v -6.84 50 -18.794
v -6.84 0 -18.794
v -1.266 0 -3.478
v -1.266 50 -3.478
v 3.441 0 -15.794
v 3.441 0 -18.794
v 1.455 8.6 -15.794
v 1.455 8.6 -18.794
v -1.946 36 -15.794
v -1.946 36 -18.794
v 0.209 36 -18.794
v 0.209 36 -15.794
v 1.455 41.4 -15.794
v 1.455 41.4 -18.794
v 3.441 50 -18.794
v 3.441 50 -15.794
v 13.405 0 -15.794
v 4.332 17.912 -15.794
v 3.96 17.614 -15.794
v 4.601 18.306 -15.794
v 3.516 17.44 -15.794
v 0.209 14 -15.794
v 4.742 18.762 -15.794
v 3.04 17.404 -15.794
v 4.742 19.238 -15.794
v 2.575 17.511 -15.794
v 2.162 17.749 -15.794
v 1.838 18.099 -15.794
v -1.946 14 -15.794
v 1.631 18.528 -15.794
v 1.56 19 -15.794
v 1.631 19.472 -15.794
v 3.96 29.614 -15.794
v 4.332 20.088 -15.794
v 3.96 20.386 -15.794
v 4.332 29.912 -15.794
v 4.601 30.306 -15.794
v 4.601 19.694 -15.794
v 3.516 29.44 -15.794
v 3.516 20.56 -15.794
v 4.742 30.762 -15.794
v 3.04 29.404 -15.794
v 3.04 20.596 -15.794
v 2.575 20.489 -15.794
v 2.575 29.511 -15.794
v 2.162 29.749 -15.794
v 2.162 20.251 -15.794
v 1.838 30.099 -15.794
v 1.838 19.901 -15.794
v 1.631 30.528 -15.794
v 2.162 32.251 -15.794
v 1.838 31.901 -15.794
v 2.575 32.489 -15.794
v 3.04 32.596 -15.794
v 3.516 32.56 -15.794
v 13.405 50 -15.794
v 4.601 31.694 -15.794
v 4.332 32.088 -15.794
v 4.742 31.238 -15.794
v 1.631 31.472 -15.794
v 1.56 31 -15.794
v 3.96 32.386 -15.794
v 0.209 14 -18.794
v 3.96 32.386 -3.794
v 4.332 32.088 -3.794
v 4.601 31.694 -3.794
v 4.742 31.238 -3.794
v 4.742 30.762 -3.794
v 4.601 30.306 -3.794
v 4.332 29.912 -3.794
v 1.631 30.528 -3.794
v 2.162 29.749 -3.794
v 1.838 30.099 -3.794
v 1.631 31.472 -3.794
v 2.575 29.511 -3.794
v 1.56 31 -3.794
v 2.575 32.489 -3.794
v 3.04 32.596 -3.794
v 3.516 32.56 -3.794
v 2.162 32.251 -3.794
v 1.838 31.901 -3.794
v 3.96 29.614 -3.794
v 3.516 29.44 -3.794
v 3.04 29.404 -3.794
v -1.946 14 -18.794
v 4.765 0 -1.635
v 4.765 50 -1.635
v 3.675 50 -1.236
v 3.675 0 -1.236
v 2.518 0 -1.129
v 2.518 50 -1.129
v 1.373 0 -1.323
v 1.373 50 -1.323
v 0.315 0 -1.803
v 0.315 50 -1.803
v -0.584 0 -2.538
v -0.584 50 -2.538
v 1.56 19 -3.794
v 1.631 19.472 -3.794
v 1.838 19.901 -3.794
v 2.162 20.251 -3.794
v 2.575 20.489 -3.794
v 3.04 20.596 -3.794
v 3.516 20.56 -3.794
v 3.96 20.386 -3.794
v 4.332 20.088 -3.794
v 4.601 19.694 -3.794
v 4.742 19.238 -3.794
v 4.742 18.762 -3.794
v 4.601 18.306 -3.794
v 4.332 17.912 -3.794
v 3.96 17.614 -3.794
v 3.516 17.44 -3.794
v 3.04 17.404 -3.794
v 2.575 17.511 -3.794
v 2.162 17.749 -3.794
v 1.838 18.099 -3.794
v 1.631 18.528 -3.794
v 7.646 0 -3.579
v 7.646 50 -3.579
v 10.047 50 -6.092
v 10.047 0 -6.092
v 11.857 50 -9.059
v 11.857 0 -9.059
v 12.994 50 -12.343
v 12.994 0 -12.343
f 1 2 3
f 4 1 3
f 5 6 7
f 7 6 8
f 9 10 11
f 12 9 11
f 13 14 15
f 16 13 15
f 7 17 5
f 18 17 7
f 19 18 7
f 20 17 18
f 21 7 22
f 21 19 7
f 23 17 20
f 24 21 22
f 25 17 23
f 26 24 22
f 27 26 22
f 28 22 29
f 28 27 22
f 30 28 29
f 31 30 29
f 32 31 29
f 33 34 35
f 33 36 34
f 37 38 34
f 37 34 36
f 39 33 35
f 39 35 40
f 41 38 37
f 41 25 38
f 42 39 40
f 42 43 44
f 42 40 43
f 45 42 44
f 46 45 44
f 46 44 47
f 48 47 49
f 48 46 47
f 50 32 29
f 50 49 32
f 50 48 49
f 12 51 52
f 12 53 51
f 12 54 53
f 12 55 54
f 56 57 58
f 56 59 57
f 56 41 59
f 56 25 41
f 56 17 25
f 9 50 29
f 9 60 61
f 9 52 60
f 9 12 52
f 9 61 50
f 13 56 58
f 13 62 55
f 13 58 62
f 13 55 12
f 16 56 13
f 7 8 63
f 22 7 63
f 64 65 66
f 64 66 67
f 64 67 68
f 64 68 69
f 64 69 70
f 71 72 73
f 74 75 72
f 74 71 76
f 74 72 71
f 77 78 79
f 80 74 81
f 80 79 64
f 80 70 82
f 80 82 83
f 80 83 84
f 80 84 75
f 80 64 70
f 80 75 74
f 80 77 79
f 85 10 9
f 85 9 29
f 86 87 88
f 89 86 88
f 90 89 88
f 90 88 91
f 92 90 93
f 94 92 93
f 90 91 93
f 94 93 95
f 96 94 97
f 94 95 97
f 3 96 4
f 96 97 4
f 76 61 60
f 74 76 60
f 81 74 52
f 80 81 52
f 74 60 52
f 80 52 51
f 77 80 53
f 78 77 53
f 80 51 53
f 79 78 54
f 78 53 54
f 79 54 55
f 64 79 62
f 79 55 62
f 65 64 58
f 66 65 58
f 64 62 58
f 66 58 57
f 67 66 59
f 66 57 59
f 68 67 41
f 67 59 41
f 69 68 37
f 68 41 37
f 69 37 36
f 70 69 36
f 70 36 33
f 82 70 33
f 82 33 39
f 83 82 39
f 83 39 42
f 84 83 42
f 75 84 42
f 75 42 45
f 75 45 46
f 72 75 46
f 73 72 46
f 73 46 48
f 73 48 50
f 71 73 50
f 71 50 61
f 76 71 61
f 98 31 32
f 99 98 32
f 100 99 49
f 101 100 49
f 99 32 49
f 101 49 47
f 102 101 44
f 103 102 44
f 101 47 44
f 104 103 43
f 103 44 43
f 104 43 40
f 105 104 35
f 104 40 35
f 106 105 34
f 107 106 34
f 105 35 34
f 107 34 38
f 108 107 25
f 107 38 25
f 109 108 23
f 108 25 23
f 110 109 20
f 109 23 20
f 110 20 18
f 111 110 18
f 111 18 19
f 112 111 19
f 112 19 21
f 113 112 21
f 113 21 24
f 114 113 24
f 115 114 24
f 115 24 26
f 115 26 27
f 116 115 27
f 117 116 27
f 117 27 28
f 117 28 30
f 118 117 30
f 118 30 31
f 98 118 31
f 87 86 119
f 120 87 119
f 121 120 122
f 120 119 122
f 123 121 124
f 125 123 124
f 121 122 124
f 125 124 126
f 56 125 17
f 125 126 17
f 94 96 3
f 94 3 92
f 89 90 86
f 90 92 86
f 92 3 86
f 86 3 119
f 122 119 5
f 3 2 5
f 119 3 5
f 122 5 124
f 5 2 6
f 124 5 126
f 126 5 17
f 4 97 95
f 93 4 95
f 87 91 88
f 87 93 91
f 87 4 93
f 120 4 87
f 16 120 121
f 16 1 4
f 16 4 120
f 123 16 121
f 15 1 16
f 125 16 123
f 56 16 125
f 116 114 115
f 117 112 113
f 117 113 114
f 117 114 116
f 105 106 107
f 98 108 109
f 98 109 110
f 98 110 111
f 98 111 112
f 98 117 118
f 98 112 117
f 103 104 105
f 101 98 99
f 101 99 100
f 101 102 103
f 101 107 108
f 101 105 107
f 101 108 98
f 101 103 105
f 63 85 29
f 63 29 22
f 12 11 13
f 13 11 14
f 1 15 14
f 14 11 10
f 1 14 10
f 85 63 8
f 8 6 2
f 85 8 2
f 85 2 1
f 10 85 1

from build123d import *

# Parameters (mm, degrees)
BOSS_EXTRUDE1_DEPTH = 50
CUT_EXTRUDE1_START  = -50
CUT_EXTRUDE1_DEPTH  = 50
SKETCH3_R           = 1.6
CUT_EXTRUDE2_DEPTH  = 15
SKETCH6_R           = 1.6
CUT_EXTRUDE4_DEPTH  = 3
SKETCH7_W           = 1.666520658
SKETCH7_H           = 50
CUT_EXTRUDE5_DEPTH  = 3
CUT_EXTRUDE6_DEPTH  = 3


with BuildPart() as part:
    # Sketch1 → Boss-Extrude1 (new body)
    with BuildSketch(Plane(origin=(0, 0, 0), x_dir=(1, 0, 0), z_dir=(0, 1, 0))):
        with BuildLine():
            Line((13.159597133, 18.793852416), (-6.840402867, 18.793852416))
            Line((-6.840402867, 18.793852416), (0, 0))
            ThreePointArc((0, 0), (10.472132847, 6.671484404), (13.159597133, 18.793852416))
        make_face()
    extrude(amount=BOSS_EXTRUDE1_DEPTH)

    # Sketch5 → Cut-Extrude1 (cut)
    with BuildSketch(Plane(origin=(0, 50, 0), x_dir=(1, 0, 0), z_dir=(0, 1, 0)).offset(CUT_EXTRUDE1_START)):
        with BuildLine():
            ThreePointArc((4.765485224, 1.634621553), (1.372703273, 1.322660653), (-1.265925556, 3.478101879))
            Line((-1.265925556, 3.478101879), (0, 0))
            ThreePointArc((0, 0), (2.446582795, 0.63119464), (4.765485224, 1.634621553))
        make_face()
    extrude(amount=CUT_EXTRUDE1_DEPTH, mode=Mode.SUBTRACT)

    # Sketch3 → Cut-Extrude2 (cut)
    with BuildSketch(Plane(origin=(0, 0, -18.793852416), x_dir=(-1, 0, 0), z_dir=(0, 0, -1))):
        with Locations((-3.159597133, 19)):
            Circle(SKETCH3_R)
        with Locations((-3.159597133, 31)):
            Circle(SKETCH3_R)
    extrude(amount=-CUT_EXTRUDE2_DEPTH, mode=Mode.SUBTRACT)

    # Sketch6 → Cut-Extrude4 (cut)
    with BuildSketch(Plane(origin=(0, 0, -18.793852416), x_dir=(-1, 0, 0), z_dir=(0, 0, -1))):
        Polygon((0.945619298, 36), (-0.208721658, 36), (-3.440876334, 50), (-13.159597133, 50), (-13.159597133, 0), (-3.440876334, 0), (-0.208721658, 14), (0.945619298, 14), align=None)
        with Locations((-3.159597133, 19)):
            Circle(SKETCH6_R, mode=Mode.SUBTRACT)
        with Locations((-3.159597133, 31)):
            Circle(SKETCH6_R, mode=Mode.SUBTRACT)
    extrude(amount=-CUT_EXTRUDE4_DEPTH, mode=Mode.SUBTRACT)

    # Sketch7 → Cut-Extrude5 (cut)
    with BuildSketch(Plane(origin=(0, 0, -18.793852416), x_dir=(-1, 0, 0), z_dir=(0, 0, -1))):
        with Locations((-13.992857462, 25)):
            Rectangle(SKETCH7_W, SKETCH7_H)
    extrude(amount=-CUT_EXTRUDE5_DEPTH, mode=Mode.SUBTRACT)

    # Sketch6<5> → Cut-Extrude6 (cut)
    with BuildSketch(Plane(origin=(0, 0, -18.793852416), x_dir=(-1, 0, 0), z_dir=(0, 0, -1))):
        Polygon((0.945619298, 36), (0.945619298, 31), (0.945619298, 19), (0.945619298, 14), (1.945619298, 14), (1.945619298, 36), align=None)
    extrude(amount=-CUT_EXTRUDE6_DEPTH, mode=Mode.SUBTRACT)


solid = part.part
